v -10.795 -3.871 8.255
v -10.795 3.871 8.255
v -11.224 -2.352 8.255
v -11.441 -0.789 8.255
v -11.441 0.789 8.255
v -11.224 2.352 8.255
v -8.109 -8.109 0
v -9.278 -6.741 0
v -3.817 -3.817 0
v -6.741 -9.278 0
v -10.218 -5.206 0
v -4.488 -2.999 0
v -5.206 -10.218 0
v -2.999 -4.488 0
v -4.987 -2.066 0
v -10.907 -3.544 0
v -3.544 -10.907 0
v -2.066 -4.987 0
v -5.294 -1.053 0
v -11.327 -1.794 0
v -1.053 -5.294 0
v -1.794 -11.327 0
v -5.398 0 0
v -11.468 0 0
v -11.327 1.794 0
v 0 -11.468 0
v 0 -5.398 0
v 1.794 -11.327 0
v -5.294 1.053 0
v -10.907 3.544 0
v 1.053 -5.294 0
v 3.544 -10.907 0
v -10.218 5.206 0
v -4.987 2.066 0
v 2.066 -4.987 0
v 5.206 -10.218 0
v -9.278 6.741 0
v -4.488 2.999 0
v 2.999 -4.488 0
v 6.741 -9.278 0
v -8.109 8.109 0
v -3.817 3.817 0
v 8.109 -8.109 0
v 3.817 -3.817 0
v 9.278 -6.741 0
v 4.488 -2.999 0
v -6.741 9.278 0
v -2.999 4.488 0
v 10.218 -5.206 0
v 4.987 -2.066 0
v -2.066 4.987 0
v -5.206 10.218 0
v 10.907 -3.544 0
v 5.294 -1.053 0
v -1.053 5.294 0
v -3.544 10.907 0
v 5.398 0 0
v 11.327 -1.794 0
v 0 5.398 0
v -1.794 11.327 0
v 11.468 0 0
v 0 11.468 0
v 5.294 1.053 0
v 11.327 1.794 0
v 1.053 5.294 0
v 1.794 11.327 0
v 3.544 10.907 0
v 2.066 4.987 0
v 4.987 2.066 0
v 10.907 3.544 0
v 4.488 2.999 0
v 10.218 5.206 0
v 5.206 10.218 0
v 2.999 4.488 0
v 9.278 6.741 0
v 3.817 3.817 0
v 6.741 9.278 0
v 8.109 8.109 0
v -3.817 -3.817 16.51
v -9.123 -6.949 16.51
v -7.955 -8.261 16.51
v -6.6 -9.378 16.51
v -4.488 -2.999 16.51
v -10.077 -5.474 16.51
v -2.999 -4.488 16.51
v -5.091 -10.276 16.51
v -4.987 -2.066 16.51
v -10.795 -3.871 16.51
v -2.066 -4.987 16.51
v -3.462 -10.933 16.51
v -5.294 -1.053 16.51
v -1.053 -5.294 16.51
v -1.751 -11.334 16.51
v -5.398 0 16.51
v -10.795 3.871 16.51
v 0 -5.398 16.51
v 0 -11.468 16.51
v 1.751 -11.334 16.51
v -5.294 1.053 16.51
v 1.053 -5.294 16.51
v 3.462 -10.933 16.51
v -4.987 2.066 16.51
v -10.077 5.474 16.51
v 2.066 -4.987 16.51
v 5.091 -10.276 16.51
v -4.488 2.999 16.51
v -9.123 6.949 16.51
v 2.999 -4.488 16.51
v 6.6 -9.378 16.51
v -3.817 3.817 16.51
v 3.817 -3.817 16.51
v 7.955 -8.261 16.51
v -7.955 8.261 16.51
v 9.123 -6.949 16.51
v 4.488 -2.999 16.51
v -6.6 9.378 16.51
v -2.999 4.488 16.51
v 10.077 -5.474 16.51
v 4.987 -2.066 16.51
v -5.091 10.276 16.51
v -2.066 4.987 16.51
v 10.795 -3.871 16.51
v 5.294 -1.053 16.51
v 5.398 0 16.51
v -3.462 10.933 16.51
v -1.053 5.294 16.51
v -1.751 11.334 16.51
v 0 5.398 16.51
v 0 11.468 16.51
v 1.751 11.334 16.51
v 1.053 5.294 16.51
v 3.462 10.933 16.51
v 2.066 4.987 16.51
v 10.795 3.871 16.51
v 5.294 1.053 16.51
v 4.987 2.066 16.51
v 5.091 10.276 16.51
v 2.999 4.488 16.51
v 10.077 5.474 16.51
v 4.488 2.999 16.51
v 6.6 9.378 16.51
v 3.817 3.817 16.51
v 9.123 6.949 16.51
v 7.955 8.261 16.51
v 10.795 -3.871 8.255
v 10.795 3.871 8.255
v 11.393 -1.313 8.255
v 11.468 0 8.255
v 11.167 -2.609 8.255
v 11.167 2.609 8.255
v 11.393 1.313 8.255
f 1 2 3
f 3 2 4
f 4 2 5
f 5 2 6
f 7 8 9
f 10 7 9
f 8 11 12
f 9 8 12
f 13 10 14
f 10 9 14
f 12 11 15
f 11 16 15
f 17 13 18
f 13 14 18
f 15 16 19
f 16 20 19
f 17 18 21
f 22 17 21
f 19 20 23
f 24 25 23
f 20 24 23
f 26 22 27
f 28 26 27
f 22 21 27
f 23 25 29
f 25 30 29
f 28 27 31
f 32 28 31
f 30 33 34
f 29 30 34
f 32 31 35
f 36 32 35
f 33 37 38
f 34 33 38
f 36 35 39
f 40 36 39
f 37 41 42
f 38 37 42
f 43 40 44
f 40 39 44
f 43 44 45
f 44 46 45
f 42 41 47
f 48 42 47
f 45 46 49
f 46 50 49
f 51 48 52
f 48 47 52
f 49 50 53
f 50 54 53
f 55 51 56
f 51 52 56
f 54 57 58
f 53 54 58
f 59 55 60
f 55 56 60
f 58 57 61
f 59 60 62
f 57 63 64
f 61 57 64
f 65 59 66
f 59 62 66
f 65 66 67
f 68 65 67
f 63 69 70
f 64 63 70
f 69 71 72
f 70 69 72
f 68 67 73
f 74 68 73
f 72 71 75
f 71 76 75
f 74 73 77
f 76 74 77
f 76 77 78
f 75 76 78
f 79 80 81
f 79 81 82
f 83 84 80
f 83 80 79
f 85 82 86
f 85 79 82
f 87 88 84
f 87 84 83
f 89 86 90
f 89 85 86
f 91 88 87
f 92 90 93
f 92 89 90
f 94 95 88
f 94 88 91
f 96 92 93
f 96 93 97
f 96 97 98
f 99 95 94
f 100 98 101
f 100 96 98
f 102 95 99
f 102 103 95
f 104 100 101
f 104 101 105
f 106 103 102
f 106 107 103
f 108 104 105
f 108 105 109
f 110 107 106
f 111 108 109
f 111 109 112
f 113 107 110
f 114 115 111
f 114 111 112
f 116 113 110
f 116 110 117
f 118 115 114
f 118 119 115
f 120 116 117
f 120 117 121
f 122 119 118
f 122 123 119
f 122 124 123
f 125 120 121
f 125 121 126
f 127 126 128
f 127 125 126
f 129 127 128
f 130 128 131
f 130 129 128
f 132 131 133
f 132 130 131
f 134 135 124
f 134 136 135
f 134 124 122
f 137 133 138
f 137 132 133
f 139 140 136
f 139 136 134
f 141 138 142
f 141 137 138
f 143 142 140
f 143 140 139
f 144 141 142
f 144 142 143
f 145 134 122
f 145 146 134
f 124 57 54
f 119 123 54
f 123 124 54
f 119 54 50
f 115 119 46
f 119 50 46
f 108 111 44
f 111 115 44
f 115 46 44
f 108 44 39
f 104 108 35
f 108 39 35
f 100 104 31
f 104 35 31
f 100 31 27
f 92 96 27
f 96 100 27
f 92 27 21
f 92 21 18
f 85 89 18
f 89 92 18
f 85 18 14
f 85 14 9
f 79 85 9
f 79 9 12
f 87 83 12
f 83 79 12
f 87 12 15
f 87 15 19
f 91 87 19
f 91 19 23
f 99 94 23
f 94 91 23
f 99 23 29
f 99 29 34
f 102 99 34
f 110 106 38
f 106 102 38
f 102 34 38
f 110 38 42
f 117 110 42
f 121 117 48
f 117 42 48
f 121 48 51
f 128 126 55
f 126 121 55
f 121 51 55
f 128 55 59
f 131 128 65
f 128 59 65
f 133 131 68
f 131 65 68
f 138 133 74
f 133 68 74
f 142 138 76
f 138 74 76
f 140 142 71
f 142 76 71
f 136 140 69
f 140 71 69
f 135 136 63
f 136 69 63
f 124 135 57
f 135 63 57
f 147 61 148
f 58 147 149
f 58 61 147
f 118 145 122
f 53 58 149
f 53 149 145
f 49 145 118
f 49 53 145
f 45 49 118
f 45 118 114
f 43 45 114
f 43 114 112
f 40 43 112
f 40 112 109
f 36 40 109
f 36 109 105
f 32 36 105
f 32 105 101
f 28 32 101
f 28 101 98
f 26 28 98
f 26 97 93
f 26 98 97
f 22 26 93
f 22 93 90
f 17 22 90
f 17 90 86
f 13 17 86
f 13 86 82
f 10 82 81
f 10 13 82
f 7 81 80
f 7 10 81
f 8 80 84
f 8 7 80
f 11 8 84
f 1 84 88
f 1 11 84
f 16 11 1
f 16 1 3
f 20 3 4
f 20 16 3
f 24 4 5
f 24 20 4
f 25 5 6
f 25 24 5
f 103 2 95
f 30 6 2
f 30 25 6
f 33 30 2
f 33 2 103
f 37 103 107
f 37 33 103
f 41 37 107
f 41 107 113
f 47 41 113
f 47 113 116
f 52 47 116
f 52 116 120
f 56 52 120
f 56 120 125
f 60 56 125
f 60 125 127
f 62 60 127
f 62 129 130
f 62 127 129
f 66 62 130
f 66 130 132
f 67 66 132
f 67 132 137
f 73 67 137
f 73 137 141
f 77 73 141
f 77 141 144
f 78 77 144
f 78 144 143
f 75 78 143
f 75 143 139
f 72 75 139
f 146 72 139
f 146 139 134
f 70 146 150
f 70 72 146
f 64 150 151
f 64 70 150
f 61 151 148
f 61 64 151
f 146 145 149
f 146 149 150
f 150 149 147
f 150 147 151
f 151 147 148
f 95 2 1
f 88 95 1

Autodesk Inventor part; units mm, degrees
ref_plane "YZ Plane" through (0, 0, 0) normal (1, 0, 0) x (0, 1, 0)
ref_plane "XZ Plane" through (0, 0, 0) normal (0, 1, 0) x (-1, 0, 0)
ref_plane "XY Plane" through (0, 0, 0) normal (0, 0, 1) x (1, 0, 0)
sketch "Sketch1" plane through (0, 0, 0) normal (0, 0, 1) x (1, 0, 0)
  circle A0 centre (0, 0) radius 11.4681
  circle A1 centre (0, 0) radius 5.3975
  dimension "d0" = 10.795
  dimension "d1" = 22.9362
extrude "Extrusion1" add sketch "Sketch1" along normal blind 8.255
sketch "Sketch2" plane through (0, 0, 8.255) normal (0, 0, 1) x (1, 0, 0)
  circle A0 centre (0, 0) radius 5.3975 projected
  circle A1 centre (0, 0) radius 11.4681 projected
  circle A2 centre (0, 0) radius 11.4681
  line L0 (-10.795, 3.8711) -> (-10.795, -3.8711)
  line L1 (10.795, 3.8711) -> (10.795, -3.8711)
  dimension "d4" = 21.59
extrude "Extrusion2" add sketch "Sketch2" along normal blind 8.255 contours L1 A1 L0
properties part number "Suction Cup Part 3 1764"
